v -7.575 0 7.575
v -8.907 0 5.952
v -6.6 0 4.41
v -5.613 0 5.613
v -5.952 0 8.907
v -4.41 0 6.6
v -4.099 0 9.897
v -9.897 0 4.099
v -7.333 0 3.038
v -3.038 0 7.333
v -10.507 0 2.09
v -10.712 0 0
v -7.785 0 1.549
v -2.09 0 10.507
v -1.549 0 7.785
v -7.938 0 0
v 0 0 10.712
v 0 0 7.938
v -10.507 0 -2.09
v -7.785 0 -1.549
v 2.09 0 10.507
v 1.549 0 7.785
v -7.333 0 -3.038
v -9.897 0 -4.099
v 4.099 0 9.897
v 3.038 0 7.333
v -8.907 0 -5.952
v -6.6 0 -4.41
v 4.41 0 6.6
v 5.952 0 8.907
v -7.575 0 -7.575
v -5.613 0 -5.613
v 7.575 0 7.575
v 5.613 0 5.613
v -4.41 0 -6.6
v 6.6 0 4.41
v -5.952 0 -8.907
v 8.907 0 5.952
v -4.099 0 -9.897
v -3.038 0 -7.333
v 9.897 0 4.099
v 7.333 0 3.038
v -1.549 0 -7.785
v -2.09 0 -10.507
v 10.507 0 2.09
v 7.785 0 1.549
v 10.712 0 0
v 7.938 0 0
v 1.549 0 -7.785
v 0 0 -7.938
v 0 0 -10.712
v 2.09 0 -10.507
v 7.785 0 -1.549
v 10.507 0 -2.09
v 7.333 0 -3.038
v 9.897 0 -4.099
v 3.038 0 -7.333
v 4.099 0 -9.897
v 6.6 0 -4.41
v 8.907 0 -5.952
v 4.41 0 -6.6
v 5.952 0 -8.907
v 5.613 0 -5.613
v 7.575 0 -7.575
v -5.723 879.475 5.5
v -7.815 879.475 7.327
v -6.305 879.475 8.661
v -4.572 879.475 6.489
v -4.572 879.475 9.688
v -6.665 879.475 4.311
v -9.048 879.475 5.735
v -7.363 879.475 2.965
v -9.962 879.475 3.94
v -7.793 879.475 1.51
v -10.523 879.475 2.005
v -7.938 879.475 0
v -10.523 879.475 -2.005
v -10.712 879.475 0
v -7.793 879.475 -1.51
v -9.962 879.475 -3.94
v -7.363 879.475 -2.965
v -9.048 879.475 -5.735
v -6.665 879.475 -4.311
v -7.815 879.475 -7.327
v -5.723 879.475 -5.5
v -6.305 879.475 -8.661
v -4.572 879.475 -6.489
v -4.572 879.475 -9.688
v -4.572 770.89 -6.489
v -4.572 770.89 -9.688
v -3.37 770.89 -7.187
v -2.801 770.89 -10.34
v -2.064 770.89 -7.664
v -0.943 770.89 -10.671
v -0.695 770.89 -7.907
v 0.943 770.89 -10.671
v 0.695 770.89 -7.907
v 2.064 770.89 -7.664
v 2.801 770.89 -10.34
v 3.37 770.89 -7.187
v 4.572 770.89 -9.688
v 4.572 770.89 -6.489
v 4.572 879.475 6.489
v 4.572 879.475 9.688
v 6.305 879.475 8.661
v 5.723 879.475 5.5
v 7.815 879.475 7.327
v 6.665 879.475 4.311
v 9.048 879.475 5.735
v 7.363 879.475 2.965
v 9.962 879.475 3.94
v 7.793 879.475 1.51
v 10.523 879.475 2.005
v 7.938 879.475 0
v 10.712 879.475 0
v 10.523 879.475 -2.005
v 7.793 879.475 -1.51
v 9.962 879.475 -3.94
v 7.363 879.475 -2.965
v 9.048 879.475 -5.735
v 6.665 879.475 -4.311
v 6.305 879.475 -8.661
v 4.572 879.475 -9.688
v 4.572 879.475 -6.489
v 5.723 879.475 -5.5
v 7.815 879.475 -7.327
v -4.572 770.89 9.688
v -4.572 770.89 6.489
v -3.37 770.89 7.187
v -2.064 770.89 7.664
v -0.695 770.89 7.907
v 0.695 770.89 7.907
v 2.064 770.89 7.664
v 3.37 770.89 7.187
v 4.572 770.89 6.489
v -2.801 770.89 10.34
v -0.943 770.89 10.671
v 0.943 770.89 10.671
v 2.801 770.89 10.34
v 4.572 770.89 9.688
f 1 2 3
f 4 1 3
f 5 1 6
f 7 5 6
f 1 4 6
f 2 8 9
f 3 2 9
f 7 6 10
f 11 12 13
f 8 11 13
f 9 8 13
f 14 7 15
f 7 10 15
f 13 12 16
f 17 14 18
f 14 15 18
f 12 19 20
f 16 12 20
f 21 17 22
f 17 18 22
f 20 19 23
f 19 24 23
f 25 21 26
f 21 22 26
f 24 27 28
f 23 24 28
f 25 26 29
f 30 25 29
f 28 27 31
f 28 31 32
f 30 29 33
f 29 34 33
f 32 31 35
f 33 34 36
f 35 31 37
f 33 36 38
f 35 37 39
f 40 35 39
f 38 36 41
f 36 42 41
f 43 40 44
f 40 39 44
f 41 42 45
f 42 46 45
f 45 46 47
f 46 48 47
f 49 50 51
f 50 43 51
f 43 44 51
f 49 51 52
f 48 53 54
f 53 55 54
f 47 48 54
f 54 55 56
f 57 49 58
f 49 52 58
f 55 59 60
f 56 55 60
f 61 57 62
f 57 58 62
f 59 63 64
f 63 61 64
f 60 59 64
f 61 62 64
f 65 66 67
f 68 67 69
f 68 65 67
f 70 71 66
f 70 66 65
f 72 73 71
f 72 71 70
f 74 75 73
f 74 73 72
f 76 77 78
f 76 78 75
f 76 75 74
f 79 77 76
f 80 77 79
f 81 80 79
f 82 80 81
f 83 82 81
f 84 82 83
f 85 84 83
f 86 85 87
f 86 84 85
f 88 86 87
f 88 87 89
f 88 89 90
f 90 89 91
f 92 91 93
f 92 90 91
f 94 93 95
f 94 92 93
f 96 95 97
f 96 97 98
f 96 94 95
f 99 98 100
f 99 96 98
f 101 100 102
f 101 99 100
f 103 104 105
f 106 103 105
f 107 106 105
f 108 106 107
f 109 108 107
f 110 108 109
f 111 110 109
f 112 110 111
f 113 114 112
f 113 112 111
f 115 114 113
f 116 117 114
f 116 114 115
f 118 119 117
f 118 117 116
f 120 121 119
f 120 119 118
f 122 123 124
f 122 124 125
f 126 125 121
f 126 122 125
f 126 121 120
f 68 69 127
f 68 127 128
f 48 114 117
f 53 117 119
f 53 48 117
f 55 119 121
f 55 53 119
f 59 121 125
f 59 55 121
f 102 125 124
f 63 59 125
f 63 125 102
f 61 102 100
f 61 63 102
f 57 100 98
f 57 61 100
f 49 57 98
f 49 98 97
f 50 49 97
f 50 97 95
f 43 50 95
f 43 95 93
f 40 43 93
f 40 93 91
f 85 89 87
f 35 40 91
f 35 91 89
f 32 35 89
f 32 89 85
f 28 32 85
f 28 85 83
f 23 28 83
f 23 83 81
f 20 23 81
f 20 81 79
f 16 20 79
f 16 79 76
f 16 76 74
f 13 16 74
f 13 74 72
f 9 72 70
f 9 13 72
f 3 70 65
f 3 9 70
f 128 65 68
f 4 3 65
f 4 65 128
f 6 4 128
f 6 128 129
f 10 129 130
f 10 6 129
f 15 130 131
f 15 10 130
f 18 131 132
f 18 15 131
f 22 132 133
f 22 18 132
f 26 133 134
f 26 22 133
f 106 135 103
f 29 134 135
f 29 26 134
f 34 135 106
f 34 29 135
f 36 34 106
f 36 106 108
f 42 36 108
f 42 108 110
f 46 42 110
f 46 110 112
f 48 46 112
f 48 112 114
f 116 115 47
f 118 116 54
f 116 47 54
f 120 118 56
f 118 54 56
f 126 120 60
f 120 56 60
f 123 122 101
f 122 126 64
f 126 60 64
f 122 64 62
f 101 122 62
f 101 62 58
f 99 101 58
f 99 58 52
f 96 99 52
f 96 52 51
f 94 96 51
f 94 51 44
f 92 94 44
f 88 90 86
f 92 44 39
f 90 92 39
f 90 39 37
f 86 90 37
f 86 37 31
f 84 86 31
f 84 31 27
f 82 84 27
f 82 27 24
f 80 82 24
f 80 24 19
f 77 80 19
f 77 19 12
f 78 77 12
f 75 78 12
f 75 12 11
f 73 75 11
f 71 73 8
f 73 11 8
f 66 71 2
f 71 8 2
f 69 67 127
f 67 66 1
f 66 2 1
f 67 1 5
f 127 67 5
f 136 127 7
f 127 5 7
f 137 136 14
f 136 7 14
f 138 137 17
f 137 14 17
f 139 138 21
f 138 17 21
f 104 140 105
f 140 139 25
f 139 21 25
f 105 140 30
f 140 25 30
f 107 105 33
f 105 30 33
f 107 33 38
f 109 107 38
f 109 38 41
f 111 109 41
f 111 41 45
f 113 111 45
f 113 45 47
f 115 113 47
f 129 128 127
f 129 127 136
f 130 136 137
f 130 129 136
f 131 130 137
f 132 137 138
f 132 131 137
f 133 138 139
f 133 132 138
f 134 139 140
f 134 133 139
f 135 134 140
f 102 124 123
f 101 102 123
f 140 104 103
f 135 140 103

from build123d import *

# Parameters (mm, degrees)
SKETCH1_R           = 10.71245
SKETCH1_R_2         = 7.9375
BOSS_EXTRUDE1_DEPTH = 879.475
SKETCH2_W           = 9.144
SKETCH2_H           = 21.4249
CUT_EXTRUDE1_DEPTH  = 108.585


with BuildPart() as part:
    # Sketch1 → Boss-Extrude1 (new body)
    with BuildSketch(Plane(origin=(0, 0, 0), x_dir=(1, 0, 0), z_dir=(0, 1, 0))):
        Circle(SKETCH1_R)
        Circle(SKETCH1_R_2, mode=Mode.SUBTRACT)
    extrude(amount=BOSS_EXTRUDE1_DEPTH)

    # Sketch2 → Cut-Extrude1 (cut)
    with BuildSketch(Plane(origin=(0, 879.475, 0), x_dir=(1, 0, 0), z_dir=(0, 1, 0))):
        Rectangle(SKETCH2_W, SKETCH2_H)
    extrude(amount=-CUT_EXTRUDE1_DEPTH, mode=Mode.SUBTRACT)


solid = part.part
